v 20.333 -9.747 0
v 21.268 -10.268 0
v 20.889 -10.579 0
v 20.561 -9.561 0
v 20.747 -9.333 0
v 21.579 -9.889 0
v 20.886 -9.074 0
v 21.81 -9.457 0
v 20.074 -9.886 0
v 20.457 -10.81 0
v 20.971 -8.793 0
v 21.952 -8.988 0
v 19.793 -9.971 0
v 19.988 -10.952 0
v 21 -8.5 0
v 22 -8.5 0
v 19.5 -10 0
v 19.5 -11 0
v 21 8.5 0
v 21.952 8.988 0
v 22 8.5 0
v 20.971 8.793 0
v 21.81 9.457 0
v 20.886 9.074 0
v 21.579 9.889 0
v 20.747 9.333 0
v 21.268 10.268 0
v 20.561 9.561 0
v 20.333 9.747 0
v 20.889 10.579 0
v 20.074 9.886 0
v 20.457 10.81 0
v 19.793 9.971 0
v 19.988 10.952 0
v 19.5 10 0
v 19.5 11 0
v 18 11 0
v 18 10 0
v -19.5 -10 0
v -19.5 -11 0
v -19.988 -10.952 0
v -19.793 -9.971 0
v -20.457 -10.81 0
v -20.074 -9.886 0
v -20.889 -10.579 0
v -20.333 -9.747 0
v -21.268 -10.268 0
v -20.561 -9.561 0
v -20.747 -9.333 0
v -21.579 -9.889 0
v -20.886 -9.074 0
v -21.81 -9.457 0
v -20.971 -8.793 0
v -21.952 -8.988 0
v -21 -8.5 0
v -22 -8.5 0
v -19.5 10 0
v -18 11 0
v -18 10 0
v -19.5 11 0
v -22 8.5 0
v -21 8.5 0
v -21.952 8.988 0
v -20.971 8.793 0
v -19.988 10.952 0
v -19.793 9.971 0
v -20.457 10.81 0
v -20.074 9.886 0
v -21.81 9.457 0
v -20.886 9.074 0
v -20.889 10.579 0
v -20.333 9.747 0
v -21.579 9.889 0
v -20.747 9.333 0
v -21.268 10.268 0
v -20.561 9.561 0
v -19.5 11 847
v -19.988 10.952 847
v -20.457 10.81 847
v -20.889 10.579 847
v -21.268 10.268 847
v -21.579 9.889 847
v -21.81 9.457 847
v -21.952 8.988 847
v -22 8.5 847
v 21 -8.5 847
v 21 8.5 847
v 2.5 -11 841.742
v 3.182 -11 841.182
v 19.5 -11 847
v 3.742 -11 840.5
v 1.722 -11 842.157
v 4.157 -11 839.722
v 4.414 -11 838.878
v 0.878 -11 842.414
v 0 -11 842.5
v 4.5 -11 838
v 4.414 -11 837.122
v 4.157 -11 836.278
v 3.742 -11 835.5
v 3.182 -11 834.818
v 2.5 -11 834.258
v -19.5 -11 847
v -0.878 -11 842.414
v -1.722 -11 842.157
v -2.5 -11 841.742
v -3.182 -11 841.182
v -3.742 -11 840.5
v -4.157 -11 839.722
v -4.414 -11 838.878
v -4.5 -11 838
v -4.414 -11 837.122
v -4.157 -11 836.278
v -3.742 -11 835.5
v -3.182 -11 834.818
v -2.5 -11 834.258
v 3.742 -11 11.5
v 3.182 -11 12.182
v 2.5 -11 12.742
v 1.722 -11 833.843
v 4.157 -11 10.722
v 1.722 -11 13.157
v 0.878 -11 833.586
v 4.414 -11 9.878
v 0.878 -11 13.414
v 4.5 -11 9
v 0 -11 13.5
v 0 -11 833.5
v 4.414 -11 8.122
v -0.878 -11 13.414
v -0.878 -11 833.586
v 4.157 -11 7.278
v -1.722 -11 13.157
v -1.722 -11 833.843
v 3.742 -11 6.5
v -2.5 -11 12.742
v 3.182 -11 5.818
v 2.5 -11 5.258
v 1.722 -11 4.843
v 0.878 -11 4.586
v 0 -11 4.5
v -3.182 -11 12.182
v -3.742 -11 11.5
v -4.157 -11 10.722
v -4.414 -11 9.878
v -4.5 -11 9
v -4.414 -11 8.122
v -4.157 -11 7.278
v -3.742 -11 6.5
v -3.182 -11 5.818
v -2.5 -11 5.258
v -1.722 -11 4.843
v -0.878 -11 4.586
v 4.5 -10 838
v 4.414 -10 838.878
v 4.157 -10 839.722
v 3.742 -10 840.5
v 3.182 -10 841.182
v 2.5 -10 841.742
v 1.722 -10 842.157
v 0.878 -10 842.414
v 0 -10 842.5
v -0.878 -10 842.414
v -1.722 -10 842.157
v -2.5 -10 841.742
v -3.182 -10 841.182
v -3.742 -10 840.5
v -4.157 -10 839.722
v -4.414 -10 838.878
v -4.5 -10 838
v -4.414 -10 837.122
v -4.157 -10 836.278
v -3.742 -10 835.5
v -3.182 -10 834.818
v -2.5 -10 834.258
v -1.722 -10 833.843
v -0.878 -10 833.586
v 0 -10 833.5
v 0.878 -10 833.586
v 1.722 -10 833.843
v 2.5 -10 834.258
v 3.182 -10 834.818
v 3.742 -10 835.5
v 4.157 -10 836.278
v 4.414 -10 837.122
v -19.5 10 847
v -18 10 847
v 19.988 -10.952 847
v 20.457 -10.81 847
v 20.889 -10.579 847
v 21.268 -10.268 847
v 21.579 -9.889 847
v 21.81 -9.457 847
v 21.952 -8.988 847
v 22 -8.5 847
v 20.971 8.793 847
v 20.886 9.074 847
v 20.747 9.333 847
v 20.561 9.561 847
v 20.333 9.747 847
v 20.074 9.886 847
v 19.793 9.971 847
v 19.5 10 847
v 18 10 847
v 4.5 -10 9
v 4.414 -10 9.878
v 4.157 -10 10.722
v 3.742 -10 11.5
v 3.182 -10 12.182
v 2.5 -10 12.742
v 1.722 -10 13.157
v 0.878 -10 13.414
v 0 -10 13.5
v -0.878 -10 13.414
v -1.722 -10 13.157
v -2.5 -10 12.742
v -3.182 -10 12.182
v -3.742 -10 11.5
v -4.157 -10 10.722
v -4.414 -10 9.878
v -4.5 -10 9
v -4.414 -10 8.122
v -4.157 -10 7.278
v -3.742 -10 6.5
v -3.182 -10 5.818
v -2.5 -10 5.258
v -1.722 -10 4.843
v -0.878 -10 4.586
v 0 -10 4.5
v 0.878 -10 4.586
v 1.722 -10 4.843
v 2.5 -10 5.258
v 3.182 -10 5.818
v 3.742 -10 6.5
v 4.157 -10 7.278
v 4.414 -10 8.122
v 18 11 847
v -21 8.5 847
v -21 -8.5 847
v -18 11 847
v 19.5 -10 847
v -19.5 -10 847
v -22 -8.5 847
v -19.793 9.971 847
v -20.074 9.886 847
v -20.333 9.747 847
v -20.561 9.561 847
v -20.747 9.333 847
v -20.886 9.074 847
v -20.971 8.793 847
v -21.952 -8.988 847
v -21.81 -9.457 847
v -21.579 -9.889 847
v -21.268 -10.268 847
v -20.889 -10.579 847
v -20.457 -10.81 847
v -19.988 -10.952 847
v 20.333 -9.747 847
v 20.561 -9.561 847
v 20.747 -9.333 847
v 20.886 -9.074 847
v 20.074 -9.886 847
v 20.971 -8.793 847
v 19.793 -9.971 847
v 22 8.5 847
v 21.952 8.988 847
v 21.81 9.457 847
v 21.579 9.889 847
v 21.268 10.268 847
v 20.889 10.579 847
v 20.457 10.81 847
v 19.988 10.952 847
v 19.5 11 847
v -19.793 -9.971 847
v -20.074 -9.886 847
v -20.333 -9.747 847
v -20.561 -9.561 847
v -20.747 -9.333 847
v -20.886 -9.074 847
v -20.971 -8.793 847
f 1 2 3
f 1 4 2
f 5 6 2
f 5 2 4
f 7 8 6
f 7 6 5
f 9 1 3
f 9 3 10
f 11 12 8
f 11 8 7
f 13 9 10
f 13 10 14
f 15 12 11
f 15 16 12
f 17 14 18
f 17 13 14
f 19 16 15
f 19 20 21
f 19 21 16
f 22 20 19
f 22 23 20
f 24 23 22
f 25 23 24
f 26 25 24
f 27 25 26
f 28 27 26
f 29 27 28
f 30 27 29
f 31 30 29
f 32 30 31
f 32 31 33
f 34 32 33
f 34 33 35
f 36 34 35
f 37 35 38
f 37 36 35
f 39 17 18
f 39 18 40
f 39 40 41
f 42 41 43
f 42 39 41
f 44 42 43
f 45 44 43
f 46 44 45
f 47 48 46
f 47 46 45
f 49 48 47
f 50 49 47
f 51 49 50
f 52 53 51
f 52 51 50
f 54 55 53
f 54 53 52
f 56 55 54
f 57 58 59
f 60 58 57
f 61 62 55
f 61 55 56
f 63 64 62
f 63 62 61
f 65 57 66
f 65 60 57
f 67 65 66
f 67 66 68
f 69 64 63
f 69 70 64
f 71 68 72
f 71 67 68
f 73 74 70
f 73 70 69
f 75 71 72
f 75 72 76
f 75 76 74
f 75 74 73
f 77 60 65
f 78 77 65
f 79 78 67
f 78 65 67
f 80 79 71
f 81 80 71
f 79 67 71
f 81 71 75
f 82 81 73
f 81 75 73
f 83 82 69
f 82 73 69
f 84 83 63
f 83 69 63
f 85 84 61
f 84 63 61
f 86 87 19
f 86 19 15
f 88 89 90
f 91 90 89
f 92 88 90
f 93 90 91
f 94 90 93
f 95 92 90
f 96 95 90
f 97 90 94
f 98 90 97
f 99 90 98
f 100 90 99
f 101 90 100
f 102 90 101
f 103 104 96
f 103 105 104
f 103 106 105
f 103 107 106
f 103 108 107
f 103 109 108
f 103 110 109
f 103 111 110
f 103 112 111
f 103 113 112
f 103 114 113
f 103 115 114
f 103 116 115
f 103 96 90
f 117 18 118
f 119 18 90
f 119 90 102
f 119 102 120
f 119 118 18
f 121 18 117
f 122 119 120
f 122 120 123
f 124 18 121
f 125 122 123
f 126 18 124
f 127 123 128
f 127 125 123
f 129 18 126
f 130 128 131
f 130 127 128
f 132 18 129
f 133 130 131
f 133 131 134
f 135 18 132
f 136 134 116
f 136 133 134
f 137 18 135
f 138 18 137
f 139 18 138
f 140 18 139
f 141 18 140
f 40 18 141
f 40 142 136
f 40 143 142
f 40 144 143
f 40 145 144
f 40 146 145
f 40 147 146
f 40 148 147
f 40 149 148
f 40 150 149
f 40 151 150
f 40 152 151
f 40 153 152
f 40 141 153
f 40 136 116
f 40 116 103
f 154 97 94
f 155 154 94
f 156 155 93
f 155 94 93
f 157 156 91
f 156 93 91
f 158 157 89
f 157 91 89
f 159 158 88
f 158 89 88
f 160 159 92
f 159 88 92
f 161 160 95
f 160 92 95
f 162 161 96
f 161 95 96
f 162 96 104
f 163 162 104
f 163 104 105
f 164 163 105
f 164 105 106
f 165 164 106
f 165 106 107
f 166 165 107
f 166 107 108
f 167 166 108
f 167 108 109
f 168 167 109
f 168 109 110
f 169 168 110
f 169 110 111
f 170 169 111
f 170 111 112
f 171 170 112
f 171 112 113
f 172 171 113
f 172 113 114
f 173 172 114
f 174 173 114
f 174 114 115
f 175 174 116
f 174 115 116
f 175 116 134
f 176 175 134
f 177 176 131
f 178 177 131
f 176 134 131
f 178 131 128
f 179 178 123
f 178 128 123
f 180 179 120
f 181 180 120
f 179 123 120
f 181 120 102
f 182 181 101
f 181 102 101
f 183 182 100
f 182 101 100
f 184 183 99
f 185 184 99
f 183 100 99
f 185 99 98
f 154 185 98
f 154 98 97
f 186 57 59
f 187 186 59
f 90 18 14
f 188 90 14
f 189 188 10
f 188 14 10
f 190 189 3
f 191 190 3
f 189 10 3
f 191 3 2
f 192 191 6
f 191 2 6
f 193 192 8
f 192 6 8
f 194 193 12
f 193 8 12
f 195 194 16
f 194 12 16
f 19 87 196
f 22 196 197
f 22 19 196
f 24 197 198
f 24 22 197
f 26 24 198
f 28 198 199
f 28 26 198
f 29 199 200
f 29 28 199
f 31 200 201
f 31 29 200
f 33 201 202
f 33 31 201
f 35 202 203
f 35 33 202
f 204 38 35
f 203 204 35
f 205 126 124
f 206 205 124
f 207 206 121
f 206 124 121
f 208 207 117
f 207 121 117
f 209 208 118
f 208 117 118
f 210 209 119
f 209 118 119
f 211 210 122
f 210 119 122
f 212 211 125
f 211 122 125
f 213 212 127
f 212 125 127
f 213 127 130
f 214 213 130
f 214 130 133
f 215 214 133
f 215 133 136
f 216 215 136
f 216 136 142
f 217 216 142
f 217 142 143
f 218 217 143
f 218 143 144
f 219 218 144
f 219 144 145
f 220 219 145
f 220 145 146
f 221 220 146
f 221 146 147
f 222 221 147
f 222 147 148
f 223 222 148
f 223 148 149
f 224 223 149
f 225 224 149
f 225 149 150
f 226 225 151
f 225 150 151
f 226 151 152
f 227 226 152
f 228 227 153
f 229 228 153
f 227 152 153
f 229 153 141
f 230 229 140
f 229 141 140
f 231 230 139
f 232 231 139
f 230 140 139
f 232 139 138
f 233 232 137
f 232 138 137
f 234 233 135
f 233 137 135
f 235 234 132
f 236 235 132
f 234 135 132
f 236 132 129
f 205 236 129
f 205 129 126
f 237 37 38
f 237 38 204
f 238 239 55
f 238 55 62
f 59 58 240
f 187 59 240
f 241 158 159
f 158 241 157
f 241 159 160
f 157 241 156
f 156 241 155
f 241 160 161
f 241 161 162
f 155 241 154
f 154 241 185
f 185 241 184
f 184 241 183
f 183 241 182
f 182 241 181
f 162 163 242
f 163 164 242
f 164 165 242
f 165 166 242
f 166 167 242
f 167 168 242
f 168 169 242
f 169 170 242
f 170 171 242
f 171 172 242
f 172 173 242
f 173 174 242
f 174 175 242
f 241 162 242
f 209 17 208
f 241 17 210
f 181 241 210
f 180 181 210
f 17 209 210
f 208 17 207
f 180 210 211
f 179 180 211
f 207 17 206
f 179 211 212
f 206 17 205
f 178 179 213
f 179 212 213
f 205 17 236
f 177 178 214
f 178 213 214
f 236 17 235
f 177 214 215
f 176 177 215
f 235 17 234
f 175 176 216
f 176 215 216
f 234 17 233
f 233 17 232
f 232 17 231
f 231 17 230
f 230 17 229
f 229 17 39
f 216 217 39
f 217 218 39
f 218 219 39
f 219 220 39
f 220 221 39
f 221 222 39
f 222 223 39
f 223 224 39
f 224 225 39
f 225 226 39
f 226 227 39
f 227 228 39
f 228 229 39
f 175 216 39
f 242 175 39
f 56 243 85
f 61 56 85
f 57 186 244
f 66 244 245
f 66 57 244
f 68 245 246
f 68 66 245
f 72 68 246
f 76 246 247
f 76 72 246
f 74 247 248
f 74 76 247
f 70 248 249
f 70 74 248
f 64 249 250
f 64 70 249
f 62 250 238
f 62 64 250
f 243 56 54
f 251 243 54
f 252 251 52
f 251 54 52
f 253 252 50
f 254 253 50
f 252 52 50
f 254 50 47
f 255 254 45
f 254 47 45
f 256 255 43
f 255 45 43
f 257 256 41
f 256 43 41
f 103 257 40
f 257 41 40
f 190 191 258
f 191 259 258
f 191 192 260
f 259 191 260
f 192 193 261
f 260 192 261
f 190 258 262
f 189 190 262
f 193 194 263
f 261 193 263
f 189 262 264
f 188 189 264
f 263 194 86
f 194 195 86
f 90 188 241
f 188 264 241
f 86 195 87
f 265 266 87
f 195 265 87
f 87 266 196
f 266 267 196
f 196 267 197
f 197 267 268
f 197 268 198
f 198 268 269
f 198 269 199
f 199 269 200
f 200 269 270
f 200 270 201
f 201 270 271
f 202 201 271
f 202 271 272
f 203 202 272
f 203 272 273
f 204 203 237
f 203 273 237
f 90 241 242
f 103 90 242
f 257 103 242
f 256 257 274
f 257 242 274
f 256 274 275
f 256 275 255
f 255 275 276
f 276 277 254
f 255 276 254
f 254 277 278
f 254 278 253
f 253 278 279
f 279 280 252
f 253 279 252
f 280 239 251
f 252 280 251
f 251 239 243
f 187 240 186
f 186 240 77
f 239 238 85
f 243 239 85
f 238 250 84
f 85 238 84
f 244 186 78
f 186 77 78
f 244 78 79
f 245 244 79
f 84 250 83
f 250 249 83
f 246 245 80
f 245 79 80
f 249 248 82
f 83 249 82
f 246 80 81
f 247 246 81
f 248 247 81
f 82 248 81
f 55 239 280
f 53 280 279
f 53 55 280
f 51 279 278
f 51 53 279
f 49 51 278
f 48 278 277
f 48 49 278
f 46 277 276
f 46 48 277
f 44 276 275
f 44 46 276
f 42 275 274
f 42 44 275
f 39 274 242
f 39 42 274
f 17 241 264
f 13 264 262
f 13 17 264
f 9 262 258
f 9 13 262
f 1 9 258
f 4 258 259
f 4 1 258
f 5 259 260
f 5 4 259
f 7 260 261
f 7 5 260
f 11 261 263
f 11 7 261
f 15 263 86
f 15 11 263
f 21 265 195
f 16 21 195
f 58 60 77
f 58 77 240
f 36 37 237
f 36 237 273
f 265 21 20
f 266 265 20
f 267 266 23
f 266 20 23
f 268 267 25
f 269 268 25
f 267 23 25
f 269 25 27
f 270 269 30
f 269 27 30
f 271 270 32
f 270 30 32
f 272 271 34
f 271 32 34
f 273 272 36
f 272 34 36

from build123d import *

# Parameters (mm, degrees)
PAD002_DEPTH    = 847
SKETCH006_R     = 4.5
POCKET003_DEPTH = 5
SKETCH008_W     = 36
SKETCH008_H     = 847
POCKET005_DEPTH = 5


with BuildPart() as part:
    # Sketch005 → Pad002 (new body)
    with BuildSketch(Plane.XY):
        with BuildLine():
            Line((-19.5, 11), (19.5, 11))
            ThreePointArc((22, 8.5), (21.267767, 10.267767), (19.5, 11))
            Line((22, 8.5), (22, -8.5))
            ThreePointArc((19.5, -11), (21.267767, -10.267767), (22, -8.5))
            Line((19.5, -11), (-19.5, -11))
            ThreePointArc((-22, -8.5), (-21.267767, -10.267767), (-19.5, -11))
            Line((-22, -8.5), (-22, 8.5))
            ThreePointArc((-19.5, 11), (-21.267767, 10.267767), (-22, 8.5))
        make_face()
        with BuildLine():
            Line((-19.5, 10), (19.5, 10))
            ThreePointArc((21, 8.5), (20.56066, 9.56066), (19.5, 10))
            Line((21, 8.5), (21, -8.5))
            ThreePointArc((19.5, -10), (20.56066, -9.56066), (21, -8.5))
            Line((19.5, -10), (-19.5, -10))
            ThreePointArc((-21, -8.5), (-20.56066, -9.56066), (-19.5, -10))
            Line((-21, -8.5), (-21, 8.5))
            ThreePointArc((-19.5, 10), (-20.56066, 9.56066), (-21, 8.5))
        make_face(mode=Mode.SUBTRACT)
    extrude(amount=PAD002_DEPTH)

    # Sketch006 (on Face7 of Pad002) → Pocket003 (cut)
    with BuildSketch(Plane.XZ.offset(11)):
        with Locations((0, 9)):
            Circle(SKETCH006_R)
        with Locations((0, 838)):
            Circle(SKETCH006_R)
    extrude(amount=-POCKET003_DEPTH, mode=Mode.SUBTRACT)

    # Sketch008 (on Face7 of Pocket003) → Pocket005 (cut)
    with BuildSketch(Plane(origin=(0, 11, 0), x_dir=(-1, 0, 0), z_dir=(0, 1, 0))):
        with Locations((0, 423.5)):
            Rectangle(SKETCH008_W, SKETCH008_H)
    extrude(amount=-POCKET005_DEPTH, mode=Mode.SUBTRACT)


solid = part.part
